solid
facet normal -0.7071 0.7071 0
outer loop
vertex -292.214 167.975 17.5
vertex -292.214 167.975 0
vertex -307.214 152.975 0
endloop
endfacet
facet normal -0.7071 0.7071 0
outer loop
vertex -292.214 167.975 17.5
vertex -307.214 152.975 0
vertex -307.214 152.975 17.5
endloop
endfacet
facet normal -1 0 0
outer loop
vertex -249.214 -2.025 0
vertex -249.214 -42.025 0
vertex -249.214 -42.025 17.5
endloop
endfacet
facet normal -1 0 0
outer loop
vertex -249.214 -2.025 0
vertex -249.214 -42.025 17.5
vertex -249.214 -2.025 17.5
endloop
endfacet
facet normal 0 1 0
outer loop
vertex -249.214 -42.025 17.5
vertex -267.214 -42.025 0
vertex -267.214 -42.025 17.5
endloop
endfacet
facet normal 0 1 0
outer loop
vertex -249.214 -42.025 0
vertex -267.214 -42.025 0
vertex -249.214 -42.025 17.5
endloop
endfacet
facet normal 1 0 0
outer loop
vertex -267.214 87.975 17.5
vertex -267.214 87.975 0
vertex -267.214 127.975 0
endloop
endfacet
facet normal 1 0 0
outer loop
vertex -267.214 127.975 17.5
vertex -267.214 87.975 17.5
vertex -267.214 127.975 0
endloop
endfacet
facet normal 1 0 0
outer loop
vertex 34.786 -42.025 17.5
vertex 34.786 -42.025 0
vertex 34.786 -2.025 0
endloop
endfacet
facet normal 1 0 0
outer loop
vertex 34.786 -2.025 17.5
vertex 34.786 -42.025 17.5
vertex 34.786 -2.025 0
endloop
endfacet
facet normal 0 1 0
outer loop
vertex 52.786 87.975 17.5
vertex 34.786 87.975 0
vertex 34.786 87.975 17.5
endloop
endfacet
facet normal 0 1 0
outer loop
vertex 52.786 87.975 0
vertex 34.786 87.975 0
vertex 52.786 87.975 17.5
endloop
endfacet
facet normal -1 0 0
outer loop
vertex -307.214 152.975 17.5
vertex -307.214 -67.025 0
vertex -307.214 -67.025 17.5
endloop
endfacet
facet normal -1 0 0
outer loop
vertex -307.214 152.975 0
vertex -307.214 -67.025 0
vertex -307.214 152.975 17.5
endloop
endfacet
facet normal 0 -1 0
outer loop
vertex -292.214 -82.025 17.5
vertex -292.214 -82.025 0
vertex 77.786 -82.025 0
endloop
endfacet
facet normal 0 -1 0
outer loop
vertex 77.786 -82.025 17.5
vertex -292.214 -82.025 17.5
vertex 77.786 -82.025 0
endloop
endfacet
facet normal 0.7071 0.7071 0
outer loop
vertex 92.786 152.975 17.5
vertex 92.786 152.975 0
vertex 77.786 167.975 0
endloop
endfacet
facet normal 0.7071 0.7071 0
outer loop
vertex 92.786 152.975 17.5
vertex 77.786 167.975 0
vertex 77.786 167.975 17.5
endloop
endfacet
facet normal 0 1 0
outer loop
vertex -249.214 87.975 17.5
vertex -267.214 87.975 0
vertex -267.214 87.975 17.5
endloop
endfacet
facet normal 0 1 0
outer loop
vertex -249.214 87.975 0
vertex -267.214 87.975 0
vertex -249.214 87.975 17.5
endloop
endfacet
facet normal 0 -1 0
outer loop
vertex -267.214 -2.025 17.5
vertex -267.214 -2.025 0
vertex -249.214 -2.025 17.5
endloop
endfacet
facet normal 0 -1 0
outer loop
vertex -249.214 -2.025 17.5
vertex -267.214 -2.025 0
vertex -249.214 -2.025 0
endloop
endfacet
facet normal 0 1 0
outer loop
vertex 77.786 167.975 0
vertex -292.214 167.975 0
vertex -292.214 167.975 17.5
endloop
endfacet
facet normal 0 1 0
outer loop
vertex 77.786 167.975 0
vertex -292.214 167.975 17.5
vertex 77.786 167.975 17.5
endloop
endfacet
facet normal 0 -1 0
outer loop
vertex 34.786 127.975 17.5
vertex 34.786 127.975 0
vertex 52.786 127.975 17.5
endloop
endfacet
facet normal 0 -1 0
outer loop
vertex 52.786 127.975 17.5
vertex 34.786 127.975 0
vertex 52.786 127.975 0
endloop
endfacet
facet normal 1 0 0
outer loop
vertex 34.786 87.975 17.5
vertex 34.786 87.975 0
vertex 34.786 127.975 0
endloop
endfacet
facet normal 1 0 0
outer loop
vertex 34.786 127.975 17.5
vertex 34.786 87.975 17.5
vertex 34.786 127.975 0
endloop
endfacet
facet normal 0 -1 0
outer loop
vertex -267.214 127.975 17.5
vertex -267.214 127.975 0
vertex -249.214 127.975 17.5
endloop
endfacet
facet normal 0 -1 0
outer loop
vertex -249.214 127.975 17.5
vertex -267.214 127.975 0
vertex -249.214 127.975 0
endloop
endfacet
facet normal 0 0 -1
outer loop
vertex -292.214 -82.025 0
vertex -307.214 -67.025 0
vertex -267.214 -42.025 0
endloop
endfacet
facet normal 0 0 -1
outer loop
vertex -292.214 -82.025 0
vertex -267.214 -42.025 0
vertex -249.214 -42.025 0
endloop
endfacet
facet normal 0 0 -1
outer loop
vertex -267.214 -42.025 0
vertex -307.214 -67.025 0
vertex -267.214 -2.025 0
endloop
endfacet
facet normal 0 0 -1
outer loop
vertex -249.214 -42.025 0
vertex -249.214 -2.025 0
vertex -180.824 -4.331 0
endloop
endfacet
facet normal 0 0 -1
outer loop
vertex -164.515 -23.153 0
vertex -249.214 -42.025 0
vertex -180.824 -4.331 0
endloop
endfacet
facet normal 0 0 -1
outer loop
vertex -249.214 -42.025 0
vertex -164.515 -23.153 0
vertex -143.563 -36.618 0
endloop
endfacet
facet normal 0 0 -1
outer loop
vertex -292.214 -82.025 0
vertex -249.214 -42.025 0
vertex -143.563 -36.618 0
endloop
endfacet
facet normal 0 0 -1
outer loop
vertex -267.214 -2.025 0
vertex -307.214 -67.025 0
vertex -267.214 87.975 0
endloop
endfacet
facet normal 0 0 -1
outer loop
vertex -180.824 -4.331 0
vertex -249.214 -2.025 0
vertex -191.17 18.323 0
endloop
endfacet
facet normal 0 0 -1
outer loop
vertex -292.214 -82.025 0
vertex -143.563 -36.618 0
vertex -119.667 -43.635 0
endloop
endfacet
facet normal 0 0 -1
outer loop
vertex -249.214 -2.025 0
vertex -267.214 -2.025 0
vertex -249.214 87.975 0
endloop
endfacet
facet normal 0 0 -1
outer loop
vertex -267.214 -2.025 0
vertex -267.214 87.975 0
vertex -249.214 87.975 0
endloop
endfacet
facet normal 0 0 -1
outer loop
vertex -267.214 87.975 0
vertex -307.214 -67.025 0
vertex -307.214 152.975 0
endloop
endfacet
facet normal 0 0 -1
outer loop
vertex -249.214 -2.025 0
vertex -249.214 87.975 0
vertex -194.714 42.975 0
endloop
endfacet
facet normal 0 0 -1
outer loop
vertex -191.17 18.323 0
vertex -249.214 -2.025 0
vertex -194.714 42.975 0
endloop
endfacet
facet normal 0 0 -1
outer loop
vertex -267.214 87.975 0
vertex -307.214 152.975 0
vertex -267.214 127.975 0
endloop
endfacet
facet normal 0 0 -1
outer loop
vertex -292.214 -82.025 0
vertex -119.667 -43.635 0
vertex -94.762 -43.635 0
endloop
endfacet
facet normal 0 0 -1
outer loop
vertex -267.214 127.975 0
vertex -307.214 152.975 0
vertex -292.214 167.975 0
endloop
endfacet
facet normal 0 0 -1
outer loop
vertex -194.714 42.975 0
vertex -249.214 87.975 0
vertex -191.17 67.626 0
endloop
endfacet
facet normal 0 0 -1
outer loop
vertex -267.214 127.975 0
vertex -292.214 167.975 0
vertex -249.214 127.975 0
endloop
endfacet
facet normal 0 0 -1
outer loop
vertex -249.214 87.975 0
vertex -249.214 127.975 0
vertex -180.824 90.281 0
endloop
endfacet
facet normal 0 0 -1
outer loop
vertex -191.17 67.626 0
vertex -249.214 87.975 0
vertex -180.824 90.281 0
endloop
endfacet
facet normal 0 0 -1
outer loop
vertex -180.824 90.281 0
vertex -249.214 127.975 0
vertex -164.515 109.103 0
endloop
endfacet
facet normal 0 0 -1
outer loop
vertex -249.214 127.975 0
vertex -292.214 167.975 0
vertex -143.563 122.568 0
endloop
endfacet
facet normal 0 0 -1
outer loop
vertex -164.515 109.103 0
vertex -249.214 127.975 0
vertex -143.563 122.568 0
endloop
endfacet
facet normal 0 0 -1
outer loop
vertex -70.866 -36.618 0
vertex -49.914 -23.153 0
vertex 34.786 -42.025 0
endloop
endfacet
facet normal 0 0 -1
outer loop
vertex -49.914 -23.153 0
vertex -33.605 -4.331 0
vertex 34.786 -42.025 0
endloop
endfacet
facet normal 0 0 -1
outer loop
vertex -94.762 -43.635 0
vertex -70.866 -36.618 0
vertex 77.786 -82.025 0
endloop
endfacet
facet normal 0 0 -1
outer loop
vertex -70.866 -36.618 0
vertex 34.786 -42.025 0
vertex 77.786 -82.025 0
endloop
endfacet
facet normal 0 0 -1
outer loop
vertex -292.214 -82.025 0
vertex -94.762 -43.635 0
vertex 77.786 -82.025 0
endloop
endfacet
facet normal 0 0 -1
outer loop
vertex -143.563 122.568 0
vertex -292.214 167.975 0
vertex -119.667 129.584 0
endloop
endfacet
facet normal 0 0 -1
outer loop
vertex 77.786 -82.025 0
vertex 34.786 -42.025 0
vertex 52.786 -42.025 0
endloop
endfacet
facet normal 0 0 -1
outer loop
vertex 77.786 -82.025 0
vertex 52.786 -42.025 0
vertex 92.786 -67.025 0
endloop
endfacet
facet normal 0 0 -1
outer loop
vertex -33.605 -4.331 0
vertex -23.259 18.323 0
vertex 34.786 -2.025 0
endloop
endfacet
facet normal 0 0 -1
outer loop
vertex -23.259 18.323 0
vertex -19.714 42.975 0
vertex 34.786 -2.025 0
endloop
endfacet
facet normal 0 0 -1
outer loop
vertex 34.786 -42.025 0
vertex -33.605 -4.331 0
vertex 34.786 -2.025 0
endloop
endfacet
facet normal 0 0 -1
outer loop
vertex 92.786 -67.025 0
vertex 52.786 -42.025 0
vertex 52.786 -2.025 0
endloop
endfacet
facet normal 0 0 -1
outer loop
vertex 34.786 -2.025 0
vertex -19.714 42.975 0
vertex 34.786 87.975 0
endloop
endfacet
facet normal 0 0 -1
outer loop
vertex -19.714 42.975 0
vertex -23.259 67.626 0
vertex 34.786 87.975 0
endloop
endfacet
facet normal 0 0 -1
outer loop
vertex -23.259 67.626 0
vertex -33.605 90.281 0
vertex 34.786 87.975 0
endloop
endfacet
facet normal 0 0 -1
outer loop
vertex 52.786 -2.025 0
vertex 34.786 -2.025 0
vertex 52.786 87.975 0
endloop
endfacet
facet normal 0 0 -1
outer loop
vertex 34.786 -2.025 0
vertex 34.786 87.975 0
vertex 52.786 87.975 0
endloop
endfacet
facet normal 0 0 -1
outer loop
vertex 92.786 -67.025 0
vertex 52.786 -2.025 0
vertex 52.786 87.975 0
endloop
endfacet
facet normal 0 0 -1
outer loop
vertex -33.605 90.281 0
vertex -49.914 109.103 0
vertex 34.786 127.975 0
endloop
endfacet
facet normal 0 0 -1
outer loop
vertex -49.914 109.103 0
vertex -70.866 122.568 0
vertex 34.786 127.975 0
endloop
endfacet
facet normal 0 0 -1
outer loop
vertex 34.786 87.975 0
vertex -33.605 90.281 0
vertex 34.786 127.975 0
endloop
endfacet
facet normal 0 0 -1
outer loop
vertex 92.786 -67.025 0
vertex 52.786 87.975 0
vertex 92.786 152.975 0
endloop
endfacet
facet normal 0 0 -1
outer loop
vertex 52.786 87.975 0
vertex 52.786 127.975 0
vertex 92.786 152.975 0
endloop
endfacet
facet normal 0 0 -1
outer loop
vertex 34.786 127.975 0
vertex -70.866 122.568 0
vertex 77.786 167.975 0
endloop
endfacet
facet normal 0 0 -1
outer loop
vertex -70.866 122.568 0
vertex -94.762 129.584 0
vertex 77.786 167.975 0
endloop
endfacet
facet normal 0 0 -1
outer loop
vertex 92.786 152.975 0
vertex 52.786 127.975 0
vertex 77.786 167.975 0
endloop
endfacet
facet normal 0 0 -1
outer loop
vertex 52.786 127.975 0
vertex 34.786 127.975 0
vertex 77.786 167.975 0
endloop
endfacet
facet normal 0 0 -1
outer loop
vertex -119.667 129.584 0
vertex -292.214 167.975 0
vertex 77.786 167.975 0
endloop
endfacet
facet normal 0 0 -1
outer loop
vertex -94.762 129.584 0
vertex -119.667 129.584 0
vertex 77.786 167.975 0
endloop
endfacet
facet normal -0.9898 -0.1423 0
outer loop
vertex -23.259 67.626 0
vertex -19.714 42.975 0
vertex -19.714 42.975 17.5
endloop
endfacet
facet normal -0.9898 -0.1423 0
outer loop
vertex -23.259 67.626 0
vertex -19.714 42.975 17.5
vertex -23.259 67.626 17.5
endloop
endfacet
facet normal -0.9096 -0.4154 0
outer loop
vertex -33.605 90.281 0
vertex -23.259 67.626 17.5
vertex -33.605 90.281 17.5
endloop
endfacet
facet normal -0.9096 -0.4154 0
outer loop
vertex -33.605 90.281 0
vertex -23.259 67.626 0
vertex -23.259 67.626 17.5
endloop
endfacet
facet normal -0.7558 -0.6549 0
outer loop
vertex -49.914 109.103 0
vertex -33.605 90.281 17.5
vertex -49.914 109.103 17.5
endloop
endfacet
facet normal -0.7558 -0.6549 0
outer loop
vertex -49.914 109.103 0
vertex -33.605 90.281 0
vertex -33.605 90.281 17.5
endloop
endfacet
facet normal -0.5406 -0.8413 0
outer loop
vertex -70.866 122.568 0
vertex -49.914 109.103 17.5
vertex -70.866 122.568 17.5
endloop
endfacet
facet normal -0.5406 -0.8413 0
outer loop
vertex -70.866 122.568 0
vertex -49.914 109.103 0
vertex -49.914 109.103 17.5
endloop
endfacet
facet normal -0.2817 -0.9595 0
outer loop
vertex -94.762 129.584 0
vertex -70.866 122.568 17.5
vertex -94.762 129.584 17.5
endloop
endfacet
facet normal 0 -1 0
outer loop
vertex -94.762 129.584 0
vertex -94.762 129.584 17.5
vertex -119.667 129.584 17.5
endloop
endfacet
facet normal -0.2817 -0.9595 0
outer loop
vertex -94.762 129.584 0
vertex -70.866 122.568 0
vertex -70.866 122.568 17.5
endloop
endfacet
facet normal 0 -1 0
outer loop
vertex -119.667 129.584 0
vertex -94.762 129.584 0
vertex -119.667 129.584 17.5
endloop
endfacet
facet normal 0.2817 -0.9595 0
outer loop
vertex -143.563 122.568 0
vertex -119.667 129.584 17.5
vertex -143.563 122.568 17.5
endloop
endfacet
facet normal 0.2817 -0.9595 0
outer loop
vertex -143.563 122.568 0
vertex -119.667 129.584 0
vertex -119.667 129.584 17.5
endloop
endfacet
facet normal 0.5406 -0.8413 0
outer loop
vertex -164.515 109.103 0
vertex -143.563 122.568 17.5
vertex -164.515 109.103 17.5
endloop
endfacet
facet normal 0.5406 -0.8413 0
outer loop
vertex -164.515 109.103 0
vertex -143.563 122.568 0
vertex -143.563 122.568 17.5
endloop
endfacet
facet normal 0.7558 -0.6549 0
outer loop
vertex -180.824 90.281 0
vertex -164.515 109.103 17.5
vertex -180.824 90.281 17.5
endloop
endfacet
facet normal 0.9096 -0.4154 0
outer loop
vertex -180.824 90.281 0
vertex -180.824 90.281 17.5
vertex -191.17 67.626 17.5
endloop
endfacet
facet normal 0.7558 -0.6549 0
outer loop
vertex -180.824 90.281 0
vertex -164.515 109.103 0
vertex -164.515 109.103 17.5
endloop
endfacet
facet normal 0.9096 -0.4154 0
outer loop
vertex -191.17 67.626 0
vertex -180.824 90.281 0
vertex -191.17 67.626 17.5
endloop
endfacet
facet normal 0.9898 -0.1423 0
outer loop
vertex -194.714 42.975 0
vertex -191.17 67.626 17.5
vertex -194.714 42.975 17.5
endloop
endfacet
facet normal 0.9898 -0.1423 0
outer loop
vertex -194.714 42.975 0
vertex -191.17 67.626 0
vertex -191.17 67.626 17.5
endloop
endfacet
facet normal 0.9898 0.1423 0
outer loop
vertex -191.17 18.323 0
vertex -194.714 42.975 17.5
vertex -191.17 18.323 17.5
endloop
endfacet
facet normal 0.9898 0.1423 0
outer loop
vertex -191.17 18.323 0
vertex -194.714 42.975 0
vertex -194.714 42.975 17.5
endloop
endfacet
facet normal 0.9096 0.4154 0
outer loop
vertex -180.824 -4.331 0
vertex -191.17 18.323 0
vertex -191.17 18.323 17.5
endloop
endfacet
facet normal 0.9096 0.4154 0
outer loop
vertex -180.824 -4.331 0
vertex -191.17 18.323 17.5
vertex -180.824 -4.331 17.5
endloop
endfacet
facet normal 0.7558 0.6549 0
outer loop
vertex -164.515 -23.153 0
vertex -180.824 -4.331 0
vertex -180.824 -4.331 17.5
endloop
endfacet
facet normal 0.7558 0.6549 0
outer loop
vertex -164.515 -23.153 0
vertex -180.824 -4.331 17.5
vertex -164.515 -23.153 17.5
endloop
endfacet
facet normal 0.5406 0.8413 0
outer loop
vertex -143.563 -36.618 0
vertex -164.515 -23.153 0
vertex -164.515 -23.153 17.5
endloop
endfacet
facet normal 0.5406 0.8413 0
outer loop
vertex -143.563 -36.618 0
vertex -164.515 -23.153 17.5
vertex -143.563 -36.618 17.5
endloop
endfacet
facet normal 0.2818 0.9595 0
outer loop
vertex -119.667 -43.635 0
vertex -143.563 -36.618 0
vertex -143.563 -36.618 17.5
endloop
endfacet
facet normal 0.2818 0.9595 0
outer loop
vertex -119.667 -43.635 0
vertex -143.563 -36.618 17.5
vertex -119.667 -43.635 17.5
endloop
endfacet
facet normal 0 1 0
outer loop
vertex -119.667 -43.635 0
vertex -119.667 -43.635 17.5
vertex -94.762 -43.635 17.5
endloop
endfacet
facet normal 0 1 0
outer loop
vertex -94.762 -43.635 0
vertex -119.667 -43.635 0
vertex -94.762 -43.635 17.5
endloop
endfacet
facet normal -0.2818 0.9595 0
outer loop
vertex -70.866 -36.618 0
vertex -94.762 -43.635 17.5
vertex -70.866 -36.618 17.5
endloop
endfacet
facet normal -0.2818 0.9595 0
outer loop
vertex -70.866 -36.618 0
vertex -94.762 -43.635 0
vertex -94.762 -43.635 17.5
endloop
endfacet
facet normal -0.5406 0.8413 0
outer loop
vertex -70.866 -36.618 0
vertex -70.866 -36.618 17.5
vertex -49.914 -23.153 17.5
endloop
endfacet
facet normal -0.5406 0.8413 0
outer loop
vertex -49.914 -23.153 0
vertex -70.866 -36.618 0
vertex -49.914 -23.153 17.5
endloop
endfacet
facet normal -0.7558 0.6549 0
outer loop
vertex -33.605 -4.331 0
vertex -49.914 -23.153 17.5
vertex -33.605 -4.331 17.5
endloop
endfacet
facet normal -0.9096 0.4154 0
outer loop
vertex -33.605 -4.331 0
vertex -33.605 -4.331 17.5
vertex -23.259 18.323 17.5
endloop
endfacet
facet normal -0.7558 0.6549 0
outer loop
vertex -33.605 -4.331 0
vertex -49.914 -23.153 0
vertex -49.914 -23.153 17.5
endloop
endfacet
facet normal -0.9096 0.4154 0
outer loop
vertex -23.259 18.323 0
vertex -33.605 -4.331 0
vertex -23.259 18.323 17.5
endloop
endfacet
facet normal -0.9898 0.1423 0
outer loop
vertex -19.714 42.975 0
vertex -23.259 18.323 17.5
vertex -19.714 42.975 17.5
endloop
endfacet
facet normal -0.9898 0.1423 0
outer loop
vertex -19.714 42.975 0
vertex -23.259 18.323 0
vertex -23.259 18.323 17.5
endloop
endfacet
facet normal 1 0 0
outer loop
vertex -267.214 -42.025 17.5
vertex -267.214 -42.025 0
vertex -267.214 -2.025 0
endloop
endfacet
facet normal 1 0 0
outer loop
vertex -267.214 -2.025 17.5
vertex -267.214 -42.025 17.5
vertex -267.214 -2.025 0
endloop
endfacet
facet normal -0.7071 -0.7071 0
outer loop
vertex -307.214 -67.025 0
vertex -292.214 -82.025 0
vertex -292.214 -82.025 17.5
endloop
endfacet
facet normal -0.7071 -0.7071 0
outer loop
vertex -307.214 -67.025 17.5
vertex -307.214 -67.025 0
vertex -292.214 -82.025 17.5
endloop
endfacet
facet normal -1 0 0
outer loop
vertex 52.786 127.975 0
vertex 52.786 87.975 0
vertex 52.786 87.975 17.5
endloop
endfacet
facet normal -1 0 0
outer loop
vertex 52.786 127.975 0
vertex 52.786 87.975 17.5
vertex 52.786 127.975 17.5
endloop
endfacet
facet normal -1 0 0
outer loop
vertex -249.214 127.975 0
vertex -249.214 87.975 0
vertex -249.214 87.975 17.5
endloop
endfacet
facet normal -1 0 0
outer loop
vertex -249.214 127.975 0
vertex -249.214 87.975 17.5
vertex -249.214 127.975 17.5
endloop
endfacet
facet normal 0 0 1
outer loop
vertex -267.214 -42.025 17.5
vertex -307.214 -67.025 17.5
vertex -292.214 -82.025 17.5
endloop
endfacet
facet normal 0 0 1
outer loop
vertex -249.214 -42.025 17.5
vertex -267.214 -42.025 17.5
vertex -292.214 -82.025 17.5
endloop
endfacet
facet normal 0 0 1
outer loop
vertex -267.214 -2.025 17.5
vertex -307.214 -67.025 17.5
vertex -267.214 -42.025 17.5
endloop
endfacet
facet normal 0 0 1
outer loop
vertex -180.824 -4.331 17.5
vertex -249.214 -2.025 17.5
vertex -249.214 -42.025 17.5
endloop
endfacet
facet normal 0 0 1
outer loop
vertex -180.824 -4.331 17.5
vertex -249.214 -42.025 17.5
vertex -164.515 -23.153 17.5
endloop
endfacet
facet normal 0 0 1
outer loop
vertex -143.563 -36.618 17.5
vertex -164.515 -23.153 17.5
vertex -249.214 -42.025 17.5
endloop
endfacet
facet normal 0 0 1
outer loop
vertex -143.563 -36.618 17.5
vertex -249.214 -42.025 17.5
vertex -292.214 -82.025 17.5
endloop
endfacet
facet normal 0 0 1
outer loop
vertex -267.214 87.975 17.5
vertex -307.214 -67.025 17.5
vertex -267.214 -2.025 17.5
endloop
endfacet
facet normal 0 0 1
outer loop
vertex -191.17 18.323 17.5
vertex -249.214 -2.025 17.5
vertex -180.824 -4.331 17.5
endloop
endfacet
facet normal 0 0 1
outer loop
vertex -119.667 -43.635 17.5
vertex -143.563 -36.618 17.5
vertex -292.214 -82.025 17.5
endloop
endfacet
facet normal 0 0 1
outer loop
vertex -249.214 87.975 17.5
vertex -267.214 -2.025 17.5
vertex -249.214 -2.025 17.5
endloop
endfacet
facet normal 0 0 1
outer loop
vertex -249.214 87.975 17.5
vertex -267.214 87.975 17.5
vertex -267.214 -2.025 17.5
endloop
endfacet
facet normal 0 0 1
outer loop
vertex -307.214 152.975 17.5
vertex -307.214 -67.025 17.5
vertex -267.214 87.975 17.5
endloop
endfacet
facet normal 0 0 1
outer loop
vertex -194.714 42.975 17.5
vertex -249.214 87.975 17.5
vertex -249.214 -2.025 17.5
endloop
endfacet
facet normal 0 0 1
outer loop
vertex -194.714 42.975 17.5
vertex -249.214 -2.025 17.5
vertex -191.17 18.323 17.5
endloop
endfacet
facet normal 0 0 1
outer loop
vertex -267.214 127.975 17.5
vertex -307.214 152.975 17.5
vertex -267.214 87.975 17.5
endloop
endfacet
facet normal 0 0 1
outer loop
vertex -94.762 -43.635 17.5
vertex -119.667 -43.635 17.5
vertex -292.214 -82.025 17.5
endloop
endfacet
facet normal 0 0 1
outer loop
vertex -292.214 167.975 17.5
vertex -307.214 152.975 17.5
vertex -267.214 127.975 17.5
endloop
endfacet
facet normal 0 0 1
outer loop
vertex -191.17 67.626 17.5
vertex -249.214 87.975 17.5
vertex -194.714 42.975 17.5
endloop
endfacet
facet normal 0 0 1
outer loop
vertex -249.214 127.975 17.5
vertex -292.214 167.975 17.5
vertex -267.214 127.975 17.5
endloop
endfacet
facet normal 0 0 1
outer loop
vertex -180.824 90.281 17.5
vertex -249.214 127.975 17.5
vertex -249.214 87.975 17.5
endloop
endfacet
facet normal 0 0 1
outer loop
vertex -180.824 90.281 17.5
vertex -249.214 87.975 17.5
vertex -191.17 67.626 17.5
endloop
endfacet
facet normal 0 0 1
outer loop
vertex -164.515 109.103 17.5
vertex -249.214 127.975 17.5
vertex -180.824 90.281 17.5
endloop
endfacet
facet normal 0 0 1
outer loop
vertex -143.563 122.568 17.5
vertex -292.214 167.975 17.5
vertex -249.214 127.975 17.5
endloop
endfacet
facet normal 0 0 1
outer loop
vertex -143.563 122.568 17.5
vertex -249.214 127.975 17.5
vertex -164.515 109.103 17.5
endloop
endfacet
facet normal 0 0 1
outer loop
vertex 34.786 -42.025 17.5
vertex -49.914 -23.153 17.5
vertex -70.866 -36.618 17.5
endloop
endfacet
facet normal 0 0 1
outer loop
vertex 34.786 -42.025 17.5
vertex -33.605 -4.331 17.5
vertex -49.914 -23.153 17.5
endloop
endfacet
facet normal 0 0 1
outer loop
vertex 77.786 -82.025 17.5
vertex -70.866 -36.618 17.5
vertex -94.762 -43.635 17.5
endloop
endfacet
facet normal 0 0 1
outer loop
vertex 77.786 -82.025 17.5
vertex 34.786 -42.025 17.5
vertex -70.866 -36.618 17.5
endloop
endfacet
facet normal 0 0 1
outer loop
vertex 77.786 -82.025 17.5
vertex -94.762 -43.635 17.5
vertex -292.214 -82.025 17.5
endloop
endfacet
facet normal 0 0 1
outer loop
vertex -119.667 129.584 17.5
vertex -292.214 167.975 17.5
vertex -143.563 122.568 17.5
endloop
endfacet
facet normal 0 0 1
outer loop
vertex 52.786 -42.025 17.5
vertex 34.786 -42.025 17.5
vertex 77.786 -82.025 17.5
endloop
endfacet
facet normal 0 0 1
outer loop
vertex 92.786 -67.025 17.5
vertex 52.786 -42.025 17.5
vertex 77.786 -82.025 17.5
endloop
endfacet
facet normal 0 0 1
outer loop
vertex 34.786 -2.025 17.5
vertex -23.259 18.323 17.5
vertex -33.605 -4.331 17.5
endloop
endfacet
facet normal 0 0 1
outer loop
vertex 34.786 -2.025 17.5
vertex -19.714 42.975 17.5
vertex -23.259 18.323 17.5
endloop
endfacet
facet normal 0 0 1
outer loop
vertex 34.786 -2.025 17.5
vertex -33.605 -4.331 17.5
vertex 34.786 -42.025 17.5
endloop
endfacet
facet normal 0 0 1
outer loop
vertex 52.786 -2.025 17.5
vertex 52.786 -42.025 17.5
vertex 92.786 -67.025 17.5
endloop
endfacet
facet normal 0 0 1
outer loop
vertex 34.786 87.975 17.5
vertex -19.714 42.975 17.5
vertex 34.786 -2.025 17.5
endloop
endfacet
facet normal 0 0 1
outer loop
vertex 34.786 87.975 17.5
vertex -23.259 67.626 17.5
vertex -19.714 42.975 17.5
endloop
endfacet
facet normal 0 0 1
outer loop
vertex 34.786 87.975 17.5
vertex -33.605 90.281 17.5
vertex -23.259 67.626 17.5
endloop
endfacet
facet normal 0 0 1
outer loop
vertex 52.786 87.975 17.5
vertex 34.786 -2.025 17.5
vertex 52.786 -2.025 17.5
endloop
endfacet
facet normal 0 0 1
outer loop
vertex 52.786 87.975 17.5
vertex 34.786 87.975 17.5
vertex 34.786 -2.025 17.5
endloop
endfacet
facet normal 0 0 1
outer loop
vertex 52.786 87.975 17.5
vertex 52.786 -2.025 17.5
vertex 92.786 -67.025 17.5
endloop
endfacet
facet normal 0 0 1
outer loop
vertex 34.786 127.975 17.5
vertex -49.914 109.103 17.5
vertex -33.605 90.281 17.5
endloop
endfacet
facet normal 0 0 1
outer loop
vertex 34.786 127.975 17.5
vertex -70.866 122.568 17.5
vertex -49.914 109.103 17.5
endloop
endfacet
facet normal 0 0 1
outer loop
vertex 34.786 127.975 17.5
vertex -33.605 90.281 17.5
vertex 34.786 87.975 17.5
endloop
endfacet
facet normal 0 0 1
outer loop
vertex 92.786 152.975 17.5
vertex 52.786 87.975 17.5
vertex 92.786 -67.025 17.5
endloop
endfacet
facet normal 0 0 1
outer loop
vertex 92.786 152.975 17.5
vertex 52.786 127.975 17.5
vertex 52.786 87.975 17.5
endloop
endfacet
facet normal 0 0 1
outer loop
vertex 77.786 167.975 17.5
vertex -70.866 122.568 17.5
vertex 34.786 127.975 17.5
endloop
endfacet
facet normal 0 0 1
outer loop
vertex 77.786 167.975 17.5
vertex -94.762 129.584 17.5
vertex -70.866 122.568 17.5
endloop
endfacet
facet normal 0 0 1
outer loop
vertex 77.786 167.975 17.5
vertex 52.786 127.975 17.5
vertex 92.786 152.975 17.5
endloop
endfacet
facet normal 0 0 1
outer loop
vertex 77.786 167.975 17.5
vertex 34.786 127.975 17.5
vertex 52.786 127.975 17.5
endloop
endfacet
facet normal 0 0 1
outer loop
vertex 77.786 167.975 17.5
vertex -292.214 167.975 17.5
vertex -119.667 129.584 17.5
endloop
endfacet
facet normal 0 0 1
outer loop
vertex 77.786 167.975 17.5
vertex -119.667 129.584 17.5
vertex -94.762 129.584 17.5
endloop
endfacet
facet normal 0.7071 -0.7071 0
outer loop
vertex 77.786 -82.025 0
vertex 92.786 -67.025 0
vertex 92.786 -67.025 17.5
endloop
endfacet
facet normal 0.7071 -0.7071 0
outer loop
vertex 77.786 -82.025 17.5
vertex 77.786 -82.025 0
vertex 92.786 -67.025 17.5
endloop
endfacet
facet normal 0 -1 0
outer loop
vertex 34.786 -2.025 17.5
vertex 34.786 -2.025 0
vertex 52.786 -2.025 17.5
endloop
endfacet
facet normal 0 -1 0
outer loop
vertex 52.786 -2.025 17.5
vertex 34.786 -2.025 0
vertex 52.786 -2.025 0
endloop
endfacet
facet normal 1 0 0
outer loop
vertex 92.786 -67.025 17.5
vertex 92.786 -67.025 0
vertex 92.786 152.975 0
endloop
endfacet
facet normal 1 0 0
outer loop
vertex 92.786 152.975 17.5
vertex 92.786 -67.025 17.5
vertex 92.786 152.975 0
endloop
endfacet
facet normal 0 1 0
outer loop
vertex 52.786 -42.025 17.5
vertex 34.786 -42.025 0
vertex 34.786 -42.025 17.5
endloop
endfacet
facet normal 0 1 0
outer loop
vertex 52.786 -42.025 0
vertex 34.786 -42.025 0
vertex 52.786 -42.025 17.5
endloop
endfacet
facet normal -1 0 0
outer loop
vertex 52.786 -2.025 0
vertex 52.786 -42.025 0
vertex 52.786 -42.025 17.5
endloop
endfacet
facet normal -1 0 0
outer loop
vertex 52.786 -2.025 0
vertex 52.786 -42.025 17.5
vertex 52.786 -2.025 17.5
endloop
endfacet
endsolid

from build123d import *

# Parameters (mm, degrees)
F0_W     = 400
F0_H     = 250
F0_W_2   = 18
F0_H_2   = 40
F0_R     = 87.5
F1_DEPTH = 17.5
F2_SIZE  = 15


with BuildPart() as f1:
    # F0 (on Top) → F1 (new body)
    with BuildSketch(Plane.XY):
        with Locations((-107.214418, 42.974777)):
            Rectangle(F0_W, F0_H)
        with Locations((-258.214418, -22.025223)):
            Rectangle(F0_W_2, F0_H_2, mode=Mode.SUBTRACT)
        with Locations((43.785582, -22.025223)):
            Rectangle(F0_W_2, F0_H_2, mode=Mode.SUBTRACT)
        with Locations((-107.214418, 42.974777)):
            Circle(F0_R, mode=Mode.SUBTRACT)
        with Locations((-258.214418, 107.974777)):
            Rectangle(F0_W_2, F0_H_2, mode=Mode.SUBTRACT)
        with Locations((43.785582, 107.974777)):
            Rectangle(F0_W_2, F0_H_2, mode=Mode.SUBTRACT)
    extrude(amount=F1_DEPTH)

    # F2
    f2_edges = [f1.edges().sort_by_distance(p)[0] for p in [
        (-307.214418, 167.974777, 8.75),
        (92.785582, 167.974777, 8.75),
        (92.785582, -82.025223, 8.75),
        (-307.214418, -82.025223, 8.75),
    ]]
    chamfer(f2_edges, length=F2_SIZE)


solid = f1.part
